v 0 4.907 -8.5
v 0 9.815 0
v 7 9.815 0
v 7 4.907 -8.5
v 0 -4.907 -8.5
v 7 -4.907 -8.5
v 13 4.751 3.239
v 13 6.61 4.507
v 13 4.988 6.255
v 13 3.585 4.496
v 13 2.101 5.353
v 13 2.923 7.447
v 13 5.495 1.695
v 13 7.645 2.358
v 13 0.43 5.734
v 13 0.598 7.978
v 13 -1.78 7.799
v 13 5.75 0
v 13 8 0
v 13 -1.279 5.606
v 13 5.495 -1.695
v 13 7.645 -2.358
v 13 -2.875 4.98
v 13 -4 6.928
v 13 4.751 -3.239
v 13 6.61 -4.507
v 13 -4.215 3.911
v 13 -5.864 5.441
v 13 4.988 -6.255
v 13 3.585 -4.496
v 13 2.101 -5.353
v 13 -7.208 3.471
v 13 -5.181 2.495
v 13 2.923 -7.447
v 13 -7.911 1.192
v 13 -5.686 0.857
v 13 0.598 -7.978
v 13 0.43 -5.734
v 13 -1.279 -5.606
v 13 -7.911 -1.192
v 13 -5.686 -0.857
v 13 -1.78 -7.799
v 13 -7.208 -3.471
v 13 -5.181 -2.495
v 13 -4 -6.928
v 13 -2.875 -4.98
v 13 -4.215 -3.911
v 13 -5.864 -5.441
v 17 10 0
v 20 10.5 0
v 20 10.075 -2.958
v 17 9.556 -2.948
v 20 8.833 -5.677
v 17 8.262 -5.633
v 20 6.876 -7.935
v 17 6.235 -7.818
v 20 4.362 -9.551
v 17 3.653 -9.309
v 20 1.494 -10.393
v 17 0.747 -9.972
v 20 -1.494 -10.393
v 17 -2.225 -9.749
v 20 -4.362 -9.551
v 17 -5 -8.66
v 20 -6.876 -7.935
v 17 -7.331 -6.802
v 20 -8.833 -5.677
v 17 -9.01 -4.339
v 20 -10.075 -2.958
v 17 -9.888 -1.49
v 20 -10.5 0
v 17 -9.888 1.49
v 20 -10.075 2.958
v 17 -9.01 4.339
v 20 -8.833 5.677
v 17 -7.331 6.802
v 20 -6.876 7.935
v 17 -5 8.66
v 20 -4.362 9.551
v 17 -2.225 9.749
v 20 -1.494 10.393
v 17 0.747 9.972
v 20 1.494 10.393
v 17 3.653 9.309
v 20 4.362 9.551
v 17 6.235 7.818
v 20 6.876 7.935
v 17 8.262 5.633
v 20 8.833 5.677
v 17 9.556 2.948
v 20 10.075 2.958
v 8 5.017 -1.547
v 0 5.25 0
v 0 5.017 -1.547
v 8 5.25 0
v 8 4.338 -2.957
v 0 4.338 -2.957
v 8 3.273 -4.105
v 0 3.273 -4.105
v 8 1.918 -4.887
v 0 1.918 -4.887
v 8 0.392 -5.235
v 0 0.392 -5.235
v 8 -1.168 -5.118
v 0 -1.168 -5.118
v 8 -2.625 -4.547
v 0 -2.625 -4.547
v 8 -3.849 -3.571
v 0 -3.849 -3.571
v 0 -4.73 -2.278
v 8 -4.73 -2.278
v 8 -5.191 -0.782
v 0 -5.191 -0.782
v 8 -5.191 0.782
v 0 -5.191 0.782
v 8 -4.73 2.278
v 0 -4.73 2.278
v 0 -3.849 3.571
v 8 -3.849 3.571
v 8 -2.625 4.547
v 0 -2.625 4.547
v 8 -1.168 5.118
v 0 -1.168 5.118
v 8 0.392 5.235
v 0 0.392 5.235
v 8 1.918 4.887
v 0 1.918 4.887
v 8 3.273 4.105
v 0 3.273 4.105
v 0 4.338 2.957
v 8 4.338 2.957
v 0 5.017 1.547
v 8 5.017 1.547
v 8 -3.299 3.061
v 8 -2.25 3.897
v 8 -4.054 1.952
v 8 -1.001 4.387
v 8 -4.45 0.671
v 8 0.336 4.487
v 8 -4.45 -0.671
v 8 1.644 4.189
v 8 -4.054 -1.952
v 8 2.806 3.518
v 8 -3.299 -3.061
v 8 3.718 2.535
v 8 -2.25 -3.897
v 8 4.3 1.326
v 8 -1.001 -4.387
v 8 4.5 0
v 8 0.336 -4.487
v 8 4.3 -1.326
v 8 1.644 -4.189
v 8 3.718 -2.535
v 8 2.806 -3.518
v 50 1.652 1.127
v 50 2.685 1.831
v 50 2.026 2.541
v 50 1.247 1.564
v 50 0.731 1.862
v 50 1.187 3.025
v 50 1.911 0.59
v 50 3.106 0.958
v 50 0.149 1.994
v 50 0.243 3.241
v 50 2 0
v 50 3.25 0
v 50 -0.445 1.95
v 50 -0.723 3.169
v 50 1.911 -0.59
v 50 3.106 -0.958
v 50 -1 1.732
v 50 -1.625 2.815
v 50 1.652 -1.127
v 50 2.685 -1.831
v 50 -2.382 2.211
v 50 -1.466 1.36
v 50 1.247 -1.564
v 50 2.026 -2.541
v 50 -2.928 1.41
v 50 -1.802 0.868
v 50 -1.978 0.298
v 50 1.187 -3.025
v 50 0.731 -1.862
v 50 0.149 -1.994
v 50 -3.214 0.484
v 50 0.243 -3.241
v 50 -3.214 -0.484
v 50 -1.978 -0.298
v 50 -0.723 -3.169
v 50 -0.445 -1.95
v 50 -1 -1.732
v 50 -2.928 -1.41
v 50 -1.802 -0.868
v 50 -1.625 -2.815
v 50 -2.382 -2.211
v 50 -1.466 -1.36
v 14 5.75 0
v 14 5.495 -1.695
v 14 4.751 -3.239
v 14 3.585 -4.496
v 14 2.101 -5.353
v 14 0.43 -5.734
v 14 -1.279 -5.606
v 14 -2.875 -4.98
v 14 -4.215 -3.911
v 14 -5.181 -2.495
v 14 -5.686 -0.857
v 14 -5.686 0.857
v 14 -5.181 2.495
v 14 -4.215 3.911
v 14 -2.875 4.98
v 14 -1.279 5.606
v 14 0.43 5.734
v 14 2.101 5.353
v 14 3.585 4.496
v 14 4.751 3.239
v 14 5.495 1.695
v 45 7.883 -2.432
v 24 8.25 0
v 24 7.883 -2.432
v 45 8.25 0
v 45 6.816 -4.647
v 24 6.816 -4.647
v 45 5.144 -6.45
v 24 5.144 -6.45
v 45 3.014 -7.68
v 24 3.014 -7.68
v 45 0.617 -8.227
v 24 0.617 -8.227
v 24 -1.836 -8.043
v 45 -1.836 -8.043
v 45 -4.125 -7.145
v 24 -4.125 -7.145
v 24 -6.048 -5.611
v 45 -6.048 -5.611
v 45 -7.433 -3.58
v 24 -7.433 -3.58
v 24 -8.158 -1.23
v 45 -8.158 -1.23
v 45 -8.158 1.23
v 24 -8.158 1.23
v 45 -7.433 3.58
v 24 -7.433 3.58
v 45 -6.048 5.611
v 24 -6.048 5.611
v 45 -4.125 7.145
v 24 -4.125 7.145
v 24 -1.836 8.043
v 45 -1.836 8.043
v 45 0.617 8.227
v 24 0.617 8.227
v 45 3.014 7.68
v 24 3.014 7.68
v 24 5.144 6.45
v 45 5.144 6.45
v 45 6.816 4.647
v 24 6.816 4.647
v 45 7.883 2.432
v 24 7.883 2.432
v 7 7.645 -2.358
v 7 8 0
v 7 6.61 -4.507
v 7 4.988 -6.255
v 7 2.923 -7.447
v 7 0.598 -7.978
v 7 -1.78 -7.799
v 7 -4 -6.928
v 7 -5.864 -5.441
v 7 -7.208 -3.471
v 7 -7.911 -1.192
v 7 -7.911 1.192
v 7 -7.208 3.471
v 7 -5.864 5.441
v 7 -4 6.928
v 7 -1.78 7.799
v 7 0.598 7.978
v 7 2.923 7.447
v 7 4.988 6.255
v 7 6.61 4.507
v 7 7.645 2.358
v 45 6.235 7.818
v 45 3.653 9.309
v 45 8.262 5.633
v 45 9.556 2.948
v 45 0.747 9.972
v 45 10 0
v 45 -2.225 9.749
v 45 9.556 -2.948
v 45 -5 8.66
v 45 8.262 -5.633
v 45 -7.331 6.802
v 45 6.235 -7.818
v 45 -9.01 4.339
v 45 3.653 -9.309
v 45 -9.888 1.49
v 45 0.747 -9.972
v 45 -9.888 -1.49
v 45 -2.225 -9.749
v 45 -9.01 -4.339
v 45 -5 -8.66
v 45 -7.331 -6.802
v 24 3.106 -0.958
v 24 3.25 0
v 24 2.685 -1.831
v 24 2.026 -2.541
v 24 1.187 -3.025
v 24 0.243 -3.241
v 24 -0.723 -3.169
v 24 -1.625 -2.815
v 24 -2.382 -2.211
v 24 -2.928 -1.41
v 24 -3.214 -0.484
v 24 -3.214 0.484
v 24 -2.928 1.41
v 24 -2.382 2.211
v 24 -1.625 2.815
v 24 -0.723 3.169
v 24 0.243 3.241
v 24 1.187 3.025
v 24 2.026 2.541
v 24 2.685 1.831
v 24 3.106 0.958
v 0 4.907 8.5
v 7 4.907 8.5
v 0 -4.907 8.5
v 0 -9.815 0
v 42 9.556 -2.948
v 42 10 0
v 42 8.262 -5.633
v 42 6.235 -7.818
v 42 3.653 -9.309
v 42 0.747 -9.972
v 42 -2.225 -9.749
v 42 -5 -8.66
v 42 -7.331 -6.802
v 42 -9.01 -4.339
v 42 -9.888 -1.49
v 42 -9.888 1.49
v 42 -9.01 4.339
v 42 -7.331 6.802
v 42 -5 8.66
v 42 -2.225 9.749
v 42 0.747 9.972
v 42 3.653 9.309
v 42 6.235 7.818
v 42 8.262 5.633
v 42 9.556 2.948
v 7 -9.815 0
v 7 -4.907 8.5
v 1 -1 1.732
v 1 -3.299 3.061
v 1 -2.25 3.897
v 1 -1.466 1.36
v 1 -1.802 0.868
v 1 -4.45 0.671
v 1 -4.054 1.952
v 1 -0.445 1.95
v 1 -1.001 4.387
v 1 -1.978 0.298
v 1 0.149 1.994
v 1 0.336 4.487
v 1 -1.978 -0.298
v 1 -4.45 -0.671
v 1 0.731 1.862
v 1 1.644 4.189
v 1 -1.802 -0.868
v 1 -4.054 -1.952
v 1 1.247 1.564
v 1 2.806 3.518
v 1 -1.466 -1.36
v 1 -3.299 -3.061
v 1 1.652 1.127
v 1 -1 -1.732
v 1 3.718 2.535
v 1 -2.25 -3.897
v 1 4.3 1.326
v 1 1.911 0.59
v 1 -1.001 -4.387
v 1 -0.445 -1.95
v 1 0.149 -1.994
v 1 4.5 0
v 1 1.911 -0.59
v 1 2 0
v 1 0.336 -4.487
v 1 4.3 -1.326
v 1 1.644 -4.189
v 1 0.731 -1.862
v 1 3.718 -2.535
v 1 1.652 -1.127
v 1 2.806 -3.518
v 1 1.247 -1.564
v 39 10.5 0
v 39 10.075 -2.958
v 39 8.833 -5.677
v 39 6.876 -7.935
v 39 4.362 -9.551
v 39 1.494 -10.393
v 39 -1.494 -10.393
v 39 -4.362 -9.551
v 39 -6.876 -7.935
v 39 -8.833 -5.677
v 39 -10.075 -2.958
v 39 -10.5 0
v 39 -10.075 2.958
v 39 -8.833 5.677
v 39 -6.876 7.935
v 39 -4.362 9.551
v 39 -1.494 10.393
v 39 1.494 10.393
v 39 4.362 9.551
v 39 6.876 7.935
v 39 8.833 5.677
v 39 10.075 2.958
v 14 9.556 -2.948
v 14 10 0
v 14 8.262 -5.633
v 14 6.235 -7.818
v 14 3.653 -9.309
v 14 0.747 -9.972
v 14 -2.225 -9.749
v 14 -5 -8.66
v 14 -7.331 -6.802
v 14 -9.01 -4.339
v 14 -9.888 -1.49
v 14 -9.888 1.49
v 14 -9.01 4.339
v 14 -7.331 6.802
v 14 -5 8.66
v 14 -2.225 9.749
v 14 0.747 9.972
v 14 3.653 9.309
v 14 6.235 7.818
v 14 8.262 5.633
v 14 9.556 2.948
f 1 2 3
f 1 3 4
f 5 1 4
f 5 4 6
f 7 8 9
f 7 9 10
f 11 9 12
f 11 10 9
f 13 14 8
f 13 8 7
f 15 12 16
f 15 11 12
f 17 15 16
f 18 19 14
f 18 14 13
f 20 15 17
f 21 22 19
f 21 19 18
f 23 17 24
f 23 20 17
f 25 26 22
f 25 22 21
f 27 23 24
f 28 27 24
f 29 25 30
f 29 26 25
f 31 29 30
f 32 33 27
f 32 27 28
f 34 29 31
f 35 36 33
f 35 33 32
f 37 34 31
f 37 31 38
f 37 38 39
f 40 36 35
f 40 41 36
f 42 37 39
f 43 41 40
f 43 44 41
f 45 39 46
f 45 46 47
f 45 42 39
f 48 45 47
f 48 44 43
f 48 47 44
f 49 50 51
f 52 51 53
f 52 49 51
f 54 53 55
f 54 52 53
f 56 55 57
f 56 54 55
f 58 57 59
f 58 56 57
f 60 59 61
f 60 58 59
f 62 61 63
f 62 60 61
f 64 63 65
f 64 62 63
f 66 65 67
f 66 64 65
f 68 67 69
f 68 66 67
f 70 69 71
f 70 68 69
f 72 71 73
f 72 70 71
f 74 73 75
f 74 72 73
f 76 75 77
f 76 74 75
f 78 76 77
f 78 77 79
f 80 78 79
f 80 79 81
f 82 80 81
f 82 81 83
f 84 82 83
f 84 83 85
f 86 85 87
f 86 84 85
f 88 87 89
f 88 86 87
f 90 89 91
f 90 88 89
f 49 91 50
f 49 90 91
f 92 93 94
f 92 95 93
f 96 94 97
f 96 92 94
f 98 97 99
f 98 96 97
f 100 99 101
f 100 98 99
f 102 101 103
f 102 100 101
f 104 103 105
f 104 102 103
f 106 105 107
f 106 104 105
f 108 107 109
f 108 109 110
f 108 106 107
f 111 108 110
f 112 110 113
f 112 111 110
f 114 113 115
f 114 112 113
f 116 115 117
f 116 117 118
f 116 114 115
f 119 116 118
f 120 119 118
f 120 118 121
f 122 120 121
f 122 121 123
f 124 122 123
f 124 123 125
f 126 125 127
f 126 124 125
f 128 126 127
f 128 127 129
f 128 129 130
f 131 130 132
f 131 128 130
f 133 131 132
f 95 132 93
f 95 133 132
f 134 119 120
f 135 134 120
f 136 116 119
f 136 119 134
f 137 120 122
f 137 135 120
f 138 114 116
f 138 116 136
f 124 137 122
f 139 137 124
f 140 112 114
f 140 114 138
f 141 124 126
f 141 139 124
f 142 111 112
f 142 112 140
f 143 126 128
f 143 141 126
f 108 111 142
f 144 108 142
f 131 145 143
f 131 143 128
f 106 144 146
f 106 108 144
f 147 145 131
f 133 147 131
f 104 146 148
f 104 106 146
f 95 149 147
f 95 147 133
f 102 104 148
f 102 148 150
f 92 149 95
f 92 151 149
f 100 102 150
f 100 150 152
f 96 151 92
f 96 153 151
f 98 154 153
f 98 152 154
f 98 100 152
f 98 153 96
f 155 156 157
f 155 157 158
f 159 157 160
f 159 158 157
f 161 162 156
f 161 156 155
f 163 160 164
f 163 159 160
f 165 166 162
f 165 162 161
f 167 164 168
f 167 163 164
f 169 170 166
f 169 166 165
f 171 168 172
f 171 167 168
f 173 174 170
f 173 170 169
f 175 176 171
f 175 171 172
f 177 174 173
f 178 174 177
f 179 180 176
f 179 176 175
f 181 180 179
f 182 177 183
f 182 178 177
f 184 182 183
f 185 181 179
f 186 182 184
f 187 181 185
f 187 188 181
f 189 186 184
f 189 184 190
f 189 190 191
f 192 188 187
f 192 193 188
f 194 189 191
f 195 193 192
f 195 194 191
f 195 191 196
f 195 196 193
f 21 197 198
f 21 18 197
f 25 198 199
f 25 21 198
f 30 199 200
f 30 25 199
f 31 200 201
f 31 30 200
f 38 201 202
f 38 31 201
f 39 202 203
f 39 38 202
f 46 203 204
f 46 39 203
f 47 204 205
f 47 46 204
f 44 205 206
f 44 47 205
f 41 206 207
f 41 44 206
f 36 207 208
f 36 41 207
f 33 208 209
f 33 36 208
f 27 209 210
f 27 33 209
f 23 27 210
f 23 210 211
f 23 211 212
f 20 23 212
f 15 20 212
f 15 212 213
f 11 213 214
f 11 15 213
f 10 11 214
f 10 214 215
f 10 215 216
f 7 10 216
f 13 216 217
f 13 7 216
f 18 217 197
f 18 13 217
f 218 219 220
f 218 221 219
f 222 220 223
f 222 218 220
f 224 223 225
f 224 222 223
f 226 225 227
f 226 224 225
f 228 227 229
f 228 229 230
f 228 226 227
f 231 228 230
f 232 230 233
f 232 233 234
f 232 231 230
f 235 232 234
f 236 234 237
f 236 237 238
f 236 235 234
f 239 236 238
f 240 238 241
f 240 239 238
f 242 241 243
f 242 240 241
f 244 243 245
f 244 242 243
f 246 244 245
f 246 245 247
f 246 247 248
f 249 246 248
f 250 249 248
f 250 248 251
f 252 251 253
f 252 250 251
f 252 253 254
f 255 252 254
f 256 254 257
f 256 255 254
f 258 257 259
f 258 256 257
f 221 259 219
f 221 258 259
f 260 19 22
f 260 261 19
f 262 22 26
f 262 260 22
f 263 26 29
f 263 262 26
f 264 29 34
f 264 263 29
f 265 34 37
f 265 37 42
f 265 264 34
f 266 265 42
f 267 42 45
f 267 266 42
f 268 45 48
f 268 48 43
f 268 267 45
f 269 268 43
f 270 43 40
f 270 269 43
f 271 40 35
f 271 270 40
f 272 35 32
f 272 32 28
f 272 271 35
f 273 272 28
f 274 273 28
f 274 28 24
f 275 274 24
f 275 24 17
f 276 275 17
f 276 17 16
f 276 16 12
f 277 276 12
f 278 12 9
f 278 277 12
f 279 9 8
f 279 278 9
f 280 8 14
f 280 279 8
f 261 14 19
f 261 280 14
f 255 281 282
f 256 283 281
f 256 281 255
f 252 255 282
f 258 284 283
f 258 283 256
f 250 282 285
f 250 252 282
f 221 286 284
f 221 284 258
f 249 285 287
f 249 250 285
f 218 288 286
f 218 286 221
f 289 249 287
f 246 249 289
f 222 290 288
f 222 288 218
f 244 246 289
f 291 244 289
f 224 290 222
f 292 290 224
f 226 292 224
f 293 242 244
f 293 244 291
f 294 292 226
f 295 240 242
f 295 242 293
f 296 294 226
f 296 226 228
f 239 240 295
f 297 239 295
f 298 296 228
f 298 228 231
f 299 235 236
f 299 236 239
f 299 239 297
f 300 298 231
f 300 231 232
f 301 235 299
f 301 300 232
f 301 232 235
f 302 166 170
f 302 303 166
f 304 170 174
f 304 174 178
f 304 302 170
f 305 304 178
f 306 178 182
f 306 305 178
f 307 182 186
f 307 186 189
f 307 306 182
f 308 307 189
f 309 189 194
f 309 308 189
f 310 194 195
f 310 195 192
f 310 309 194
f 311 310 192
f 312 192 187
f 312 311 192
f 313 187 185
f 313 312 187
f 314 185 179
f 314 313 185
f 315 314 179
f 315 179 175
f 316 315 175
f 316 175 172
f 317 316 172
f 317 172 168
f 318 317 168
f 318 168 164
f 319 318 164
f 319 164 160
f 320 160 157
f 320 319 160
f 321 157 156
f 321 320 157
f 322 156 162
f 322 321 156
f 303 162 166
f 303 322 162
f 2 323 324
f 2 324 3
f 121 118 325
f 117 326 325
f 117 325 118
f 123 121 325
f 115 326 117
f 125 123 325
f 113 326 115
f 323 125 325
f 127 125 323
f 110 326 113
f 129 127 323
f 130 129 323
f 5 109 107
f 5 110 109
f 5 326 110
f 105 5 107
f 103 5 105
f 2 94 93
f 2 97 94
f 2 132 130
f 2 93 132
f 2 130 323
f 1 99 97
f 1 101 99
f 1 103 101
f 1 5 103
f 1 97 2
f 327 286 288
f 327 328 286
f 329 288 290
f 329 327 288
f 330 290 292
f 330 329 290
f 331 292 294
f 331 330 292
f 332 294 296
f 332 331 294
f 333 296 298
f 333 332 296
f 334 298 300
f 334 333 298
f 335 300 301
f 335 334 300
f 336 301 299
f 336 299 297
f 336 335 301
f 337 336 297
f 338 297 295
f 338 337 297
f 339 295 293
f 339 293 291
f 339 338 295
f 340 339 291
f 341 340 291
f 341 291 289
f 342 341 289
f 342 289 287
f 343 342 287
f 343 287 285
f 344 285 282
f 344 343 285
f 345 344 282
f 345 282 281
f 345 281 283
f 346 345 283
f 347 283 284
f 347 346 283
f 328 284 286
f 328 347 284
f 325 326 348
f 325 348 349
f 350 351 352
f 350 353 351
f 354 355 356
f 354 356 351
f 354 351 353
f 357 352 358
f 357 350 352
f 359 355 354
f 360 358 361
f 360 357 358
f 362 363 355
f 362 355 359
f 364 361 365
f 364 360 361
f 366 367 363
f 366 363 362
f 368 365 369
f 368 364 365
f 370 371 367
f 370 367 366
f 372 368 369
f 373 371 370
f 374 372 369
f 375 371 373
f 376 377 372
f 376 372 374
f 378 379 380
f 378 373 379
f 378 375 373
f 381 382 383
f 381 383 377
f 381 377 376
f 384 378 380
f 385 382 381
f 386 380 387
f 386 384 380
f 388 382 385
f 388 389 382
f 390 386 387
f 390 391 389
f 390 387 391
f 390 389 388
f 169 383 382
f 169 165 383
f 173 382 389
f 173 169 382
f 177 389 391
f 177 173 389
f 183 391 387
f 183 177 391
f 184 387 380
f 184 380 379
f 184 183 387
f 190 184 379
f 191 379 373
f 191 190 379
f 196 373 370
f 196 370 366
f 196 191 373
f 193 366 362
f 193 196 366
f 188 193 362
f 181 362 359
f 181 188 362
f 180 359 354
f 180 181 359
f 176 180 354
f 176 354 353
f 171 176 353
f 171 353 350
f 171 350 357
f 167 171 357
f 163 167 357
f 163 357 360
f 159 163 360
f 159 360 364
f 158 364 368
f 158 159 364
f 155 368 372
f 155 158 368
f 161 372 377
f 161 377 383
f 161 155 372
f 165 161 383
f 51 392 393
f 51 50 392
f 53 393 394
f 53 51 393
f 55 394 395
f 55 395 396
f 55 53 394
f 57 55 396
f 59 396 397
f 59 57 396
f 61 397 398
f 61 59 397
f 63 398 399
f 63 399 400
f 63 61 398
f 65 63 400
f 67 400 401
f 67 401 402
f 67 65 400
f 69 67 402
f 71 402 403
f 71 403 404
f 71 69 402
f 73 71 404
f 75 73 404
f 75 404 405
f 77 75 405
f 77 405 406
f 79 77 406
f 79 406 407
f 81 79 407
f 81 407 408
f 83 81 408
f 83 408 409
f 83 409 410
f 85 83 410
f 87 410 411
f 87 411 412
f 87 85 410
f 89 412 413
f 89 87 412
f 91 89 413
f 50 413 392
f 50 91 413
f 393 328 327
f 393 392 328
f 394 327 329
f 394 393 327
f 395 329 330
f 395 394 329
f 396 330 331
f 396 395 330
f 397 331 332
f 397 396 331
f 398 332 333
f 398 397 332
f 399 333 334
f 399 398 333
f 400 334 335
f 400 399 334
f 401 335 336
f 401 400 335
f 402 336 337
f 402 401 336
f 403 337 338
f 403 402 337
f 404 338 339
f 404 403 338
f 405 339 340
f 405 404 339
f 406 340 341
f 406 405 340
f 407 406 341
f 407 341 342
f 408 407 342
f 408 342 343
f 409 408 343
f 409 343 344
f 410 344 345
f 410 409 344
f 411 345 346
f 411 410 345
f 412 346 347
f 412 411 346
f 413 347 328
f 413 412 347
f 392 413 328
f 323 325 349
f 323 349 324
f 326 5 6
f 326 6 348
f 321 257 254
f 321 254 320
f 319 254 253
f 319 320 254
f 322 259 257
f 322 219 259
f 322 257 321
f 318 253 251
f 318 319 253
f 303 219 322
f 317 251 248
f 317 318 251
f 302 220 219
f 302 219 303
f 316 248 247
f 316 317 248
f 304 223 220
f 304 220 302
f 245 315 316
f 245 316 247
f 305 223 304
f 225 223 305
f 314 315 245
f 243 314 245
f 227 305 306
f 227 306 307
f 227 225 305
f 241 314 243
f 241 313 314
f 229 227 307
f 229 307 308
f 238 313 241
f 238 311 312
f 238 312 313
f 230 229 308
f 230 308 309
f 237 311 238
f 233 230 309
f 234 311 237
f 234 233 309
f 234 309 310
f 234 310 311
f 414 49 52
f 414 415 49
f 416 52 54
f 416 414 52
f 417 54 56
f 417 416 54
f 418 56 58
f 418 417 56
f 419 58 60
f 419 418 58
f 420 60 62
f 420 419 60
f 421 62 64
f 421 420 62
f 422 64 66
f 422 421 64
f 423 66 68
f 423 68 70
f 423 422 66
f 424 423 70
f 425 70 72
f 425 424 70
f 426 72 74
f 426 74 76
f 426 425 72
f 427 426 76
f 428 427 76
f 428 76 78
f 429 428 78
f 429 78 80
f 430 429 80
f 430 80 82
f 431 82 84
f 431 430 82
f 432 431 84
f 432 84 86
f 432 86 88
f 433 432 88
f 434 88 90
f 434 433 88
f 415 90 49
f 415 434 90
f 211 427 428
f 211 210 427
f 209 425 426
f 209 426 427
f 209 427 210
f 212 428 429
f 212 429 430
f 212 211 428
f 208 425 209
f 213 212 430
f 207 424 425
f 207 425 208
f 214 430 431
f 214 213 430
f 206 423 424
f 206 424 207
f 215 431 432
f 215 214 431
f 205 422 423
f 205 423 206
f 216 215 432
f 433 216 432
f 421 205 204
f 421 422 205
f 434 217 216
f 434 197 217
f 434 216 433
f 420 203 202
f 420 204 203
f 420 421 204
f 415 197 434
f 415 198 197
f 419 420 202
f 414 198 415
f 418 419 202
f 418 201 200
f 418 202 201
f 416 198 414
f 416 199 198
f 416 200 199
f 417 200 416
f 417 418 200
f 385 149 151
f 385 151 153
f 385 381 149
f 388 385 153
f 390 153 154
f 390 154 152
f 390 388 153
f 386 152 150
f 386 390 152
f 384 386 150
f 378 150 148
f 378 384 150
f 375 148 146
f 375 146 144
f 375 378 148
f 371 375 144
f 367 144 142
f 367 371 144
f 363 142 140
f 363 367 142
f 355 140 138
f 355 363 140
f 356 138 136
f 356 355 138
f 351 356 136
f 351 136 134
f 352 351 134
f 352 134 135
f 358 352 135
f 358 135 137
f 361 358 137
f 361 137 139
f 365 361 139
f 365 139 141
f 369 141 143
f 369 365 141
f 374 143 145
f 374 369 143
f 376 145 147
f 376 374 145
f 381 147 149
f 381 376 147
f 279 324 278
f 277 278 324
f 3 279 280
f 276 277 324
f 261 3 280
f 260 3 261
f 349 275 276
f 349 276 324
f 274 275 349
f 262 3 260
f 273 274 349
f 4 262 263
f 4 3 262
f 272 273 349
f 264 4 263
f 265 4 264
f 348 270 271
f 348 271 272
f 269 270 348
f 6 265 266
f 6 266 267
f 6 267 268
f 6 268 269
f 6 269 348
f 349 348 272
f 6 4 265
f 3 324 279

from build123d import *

# Parameters (mm, degrees)
SCHNITT_LINEAR_AUSTRAGEN1_REACH = 54.364
SKIZZE2_R                       = 11


with BuildPart() as part:
    # Skizze1 → Rotation3 (revolve)
    with BuildSketch(Plane.XY):
        Polygon((1, 2), (50, 2), (50, 3.25), (24, 3.25), (24, 8.25), (45, 8.25), (45, 10), (42, 10), (39, 10.5), (20, 10.5), (17, 10), (14, 10), (14, 5.75), (13, 5.75), (13, 8), (7, 8), (7, 11), (0, 11), (0, 5.25), (8, 5.25), (8, 4.5), (1, 4.5), align=None)
    revolve(axis=Axis((92.390187717, 0, 0), (-1, 0, 0)))

    # Skizze2 → Schnitt-Linear austragen1 (cut, up to next)
    with BuildSketch(Plane.ZY, mode=Mode.PRIVATE) as schnitt_linear_austragen1_sk1:
        Circle(SKIZZE2_R)
        Polygon((-8.5, -4.907477288), (0, -9.814954576), (8.5, -4.907477288), (8.5, 4.907477288), (0, 9.814954576), (-8.5, 4.907477288), align=None, mode=Mode.SUBTRACT)
    schnitt_linear_austragen1_tool1 = extrude(schnitt_linear_austragen1_sk1.sketch, amount=-SCHNITT_LINEAR_AUSTRAGEN1_REACH, mode=Mode.PRIVATE) & part.part
    add(schnitt_linear_austragen1_tool1.solids().sort_by_distance((0, 0, -10.688873))[0], mode=Mode.SUBTRACT)


solid = part.part
